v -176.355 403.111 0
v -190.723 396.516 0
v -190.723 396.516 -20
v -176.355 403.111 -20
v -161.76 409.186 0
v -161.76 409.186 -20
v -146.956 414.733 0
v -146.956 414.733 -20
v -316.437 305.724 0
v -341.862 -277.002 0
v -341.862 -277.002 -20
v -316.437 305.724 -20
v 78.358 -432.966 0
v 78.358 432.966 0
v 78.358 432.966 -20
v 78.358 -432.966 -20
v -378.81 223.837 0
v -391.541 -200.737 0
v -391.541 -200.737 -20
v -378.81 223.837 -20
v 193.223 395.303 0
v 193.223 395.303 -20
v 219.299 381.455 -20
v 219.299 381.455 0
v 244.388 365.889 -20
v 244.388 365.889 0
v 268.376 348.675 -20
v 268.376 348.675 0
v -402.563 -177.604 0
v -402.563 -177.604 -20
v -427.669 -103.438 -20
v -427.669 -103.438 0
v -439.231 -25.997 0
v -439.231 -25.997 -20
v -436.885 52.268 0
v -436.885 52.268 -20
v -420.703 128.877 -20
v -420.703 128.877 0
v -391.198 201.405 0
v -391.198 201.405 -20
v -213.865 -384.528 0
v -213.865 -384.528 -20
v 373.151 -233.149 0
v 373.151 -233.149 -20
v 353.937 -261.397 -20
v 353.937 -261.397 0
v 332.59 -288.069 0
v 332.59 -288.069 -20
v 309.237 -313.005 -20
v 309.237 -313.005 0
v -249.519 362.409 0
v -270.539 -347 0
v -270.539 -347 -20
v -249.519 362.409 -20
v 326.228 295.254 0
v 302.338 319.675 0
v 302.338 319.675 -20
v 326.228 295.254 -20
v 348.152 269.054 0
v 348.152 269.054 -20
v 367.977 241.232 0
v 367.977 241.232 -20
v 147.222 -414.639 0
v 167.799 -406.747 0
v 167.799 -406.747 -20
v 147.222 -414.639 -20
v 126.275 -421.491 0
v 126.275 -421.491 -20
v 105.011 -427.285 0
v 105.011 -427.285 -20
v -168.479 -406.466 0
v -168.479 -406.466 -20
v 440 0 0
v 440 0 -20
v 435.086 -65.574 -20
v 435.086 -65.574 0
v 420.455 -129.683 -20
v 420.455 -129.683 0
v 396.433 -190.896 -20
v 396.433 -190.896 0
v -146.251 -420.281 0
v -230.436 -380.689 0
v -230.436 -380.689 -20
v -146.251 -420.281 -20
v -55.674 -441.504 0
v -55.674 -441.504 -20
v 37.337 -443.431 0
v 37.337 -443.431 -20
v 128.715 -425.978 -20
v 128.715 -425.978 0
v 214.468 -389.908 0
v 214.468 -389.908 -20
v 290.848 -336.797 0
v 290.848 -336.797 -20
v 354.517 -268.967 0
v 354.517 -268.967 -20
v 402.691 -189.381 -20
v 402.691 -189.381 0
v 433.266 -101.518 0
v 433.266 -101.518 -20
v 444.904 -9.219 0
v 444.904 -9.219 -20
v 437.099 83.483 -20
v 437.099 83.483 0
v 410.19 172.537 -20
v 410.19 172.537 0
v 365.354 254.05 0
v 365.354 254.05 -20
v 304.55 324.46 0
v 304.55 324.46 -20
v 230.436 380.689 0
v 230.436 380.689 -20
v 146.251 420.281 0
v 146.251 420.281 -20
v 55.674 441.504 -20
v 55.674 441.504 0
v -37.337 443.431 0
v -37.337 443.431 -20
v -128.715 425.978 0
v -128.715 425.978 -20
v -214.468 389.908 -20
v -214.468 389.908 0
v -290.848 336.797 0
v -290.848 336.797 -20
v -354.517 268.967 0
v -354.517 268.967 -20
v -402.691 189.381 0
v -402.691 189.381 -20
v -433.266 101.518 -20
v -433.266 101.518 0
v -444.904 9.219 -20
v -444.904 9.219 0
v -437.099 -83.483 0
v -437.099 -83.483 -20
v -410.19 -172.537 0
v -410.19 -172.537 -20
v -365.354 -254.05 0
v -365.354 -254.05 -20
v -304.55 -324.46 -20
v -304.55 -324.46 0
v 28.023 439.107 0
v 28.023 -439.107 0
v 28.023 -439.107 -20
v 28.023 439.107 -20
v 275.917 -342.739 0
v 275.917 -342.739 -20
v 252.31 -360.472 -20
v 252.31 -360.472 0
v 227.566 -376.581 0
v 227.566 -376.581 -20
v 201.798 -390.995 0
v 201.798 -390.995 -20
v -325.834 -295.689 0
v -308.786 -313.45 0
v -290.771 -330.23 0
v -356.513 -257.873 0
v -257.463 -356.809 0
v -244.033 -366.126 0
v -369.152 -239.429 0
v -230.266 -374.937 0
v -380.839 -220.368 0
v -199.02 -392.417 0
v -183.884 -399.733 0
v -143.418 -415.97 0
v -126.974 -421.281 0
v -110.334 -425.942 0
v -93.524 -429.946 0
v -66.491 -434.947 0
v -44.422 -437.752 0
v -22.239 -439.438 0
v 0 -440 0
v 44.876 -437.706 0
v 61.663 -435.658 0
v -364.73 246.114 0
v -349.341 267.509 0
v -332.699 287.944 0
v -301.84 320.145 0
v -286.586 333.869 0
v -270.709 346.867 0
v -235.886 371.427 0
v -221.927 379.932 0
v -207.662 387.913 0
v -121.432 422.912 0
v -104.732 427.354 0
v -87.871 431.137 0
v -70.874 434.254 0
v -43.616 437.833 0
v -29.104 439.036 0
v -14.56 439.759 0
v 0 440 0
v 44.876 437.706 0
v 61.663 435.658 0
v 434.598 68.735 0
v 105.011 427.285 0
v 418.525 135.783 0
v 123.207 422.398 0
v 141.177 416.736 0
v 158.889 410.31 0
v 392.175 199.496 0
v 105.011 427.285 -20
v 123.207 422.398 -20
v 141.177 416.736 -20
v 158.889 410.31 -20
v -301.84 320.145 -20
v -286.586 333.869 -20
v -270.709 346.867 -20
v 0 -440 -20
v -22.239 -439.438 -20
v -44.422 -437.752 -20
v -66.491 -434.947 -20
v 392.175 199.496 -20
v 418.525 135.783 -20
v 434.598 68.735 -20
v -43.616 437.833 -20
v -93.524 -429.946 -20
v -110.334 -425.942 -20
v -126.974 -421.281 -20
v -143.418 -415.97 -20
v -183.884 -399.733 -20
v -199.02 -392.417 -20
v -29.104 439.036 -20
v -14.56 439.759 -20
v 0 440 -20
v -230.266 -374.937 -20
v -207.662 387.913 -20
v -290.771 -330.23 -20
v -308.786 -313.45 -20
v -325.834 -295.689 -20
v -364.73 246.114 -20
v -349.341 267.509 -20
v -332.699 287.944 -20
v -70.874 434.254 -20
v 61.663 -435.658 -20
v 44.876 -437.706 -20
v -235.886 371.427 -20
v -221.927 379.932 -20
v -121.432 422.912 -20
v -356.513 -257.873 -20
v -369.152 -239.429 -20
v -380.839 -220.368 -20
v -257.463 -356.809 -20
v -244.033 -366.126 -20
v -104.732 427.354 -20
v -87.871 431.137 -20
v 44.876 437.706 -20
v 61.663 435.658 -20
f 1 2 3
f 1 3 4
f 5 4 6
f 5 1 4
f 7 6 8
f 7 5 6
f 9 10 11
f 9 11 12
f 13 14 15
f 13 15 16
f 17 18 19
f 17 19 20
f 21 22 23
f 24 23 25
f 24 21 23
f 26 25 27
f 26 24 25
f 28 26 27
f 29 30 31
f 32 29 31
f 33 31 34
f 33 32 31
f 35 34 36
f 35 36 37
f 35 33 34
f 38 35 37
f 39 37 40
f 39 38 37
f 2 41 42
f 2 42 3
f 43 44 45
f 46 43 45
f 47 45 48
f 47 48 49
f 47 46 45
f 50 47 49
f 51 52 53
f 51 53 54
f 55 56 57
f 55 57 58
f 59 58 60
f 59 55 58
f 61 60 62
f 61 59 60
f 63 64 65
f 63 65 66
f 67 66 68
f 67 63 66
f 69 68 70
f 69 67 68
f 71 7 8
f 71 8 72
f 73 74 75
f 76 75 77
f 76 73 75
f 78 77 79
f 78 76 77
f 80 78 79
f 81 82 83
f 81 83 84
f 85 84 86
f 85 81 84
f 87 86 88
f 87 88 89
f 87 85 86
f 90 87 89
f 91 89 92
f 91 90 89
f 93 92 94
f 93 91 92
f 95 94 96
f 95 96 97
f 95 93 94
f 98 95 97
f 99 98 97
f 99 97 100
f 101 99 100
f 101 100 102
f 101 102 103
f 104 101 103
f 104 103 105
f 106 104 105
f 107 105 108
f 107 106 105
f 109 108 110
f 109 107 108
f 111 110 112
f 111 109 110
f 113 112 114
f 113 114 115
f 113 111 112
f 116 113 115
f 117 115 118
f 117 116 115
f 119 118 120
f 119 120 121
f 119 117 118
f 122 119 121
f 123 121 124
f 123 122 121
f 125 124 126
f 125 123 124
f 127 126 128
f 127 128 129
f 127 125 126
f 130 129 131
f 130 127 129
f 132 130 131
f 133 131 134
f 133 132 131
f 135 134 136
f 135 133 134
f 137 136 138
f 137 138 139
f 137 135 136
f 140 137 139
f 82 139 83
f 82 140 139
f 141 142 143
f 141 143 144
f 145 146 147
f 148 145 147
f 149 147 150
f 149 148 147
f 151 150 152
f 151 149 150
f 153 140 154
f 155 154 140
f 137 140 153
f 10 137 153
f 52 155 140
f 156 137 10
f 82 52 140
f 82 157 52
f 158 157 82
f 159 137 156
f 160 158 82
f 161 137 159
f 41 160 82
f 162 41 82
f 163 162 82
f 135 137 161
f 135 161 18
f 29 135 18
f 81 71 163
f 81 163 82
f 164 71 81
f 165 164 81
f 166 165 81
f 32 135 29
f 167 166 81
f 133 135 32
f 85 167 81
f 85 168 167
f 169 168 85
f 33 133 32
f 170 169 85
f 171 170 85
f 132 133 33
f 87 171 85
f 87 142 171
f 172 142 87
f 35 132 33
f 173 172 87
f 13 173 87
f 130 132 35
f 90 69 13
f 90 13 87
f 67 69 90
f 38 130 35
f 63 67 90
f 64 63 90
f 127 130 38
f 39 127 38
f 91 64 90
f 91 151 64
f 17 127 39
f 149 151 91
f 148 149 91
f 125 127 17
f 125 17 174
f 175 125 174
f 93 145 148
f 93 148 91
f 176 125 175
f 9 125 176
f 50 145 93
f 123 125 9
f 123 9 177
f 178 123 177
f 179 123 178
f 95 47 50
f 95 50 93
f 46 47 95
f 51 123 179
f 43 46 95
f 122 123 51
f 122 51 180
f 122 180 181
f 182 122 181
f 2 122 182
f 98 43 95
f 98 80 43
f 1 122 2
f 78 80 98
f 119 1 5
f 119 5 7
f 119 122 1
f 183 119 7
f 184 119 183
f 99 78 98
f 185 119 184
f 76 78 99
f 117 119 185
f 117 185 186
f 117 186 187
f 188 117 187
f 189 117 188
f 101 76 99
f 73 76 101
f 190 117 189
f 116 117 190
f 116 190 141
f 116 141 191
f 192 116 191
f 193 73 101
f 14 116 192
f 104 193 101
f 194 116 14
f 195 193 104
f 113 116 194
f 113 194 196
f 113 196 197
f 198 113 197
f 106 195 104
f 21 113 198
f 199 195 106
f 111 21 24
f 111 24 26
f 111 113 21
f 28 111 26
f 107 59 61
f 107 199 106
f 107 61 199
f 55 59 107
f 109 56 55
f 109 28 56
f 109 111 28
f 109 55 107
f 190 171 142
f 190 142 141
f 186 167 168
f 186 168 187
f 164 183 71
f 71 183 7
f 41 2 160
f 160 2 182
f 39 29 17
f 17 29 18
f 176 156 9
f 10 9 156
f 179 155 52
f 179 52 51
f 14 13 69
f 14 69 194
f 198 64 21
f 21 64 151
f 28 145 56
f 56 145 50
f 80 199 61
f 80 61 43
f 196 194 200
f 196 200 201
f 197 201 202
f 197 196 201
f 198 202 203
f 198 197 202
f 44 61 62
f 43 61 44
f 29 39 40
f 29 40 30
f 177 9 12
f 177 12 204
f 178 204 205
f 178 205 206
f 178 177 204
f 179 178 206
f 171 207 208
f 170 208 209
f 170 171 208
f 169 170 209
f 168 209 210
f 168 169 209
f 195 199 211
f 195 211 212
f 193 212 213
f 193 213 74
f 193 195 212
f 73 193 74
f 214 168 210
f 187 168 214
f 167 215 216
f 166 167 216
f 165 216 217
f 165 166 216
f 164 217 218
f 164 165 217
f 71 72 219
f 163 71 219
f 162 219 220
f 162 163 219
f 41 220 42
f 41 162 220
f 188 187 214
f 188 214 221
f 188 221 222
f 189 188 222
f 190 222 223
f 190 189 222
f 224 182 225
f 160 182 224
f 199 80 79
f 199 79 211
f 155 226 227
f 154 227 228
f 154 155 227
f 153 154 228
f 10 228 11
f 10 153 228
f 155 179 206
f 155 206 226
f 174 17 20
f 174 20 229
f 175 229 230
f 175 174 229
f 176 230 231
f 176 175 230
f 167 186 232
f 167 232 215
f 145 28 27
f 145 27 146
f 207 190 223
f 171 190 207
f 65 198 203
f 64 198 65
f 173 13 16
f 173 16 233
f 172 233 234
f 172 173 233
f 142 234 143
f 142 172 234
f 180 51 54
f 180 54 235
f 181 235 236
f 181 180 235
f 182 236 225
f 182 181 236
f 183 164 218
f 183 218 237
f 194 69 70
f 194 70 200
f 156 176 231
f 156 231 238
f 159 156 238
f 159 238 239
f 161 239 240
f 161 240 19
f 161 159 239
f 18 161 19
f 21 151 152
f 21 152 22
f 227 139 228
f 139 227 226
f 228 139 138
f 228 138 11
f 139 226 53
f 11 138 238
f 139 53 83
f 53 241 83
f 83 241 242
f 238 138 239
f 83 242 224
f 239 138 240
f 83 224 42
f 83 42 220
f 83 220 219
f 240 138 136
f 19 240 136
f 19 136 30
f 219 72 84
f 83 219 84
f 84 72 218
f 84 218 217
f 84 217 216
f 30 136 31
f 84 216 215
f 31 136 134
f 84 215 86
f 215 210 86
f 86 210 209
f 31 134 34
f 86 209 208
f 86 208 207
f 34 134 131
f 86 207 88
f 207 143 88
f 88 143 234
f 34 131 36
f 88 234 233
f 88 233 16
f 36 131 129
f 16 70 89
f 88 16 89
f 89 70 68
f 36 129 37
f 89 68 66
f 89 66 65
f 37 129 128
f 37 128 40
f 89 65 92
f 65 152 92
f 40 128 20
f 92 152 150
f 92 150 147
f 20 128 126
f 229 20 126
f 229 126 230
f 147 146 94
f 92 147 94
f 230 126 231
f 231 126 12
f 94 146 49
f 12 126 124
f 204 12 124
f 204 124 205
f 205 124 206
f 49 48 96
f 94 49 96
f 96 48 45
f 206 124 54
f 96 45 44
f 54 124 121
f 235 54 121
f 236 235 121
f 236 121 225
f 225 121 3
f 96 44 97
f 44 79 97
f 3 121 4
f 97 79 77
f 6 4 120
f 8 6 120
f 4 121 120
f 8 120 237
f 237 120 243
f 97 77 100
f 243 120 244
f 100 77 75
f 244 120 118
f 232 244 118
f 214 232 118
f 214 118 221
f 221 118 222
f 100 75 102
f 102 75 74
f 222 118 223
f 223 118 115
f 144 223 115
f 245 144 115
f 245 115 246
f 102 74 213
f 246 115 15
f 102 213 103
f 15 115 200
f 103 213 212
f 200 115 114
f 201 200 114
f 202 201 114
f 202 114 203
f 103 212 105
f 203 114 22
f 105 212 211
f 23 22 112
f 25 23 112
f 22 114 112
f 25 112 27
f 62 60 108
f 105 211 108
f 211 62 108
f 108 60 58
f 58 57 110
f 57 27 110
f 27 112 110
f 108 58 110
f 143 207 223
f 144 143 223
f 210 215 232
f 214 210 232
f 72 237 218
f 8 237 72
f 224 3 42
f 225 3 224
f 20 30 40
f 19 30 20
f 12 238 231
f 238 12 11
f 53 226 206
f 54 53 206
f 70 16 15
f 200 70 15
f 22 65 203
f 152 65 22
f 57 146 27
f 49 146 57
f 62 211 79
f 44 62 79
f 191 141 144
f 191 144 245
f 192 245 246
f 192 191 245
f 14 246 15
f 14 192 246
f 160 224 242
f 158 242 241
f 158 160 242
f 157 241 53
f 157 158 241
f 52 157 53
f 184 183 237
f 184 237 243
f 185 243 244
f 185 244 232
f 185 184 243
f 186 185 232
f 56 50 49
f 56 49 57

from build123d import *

# Parameters (mm, degrees)
F1_DEPTH = 20


with BuildPart() as f1:
    # F0 (on Top) → F1 (new body)
    with BuildSketch(Plane.XY):
        with BuildLine():
            Line((-270.5386970375, -346.9997311313), (-270.7217620056, -353.178039488))
            ThreePointArc((-270.7217620056, -353.178039488), (-250.9562000988, -367.4860346081), (-230.4360952891, -380.6891198707))
            Line((-230.4360952891, -380.6891198707), (-230.265657339, -374.9369641023))
            ThreePointArc((-230.2656573389, -374.9369641023), (-250.7914922543, -361.5295664436), (-270.5386970375, -346.9997311313))
        make_face()
        with BuildLine():
            ThreePointArc((-402.562994487, -177.6035908131), (-397.2206510106, -189.250507029), (-391.5414264828, -200.7369207392))
            Line((-391.5414264828, -200.7369207392), (-378.8101580312, 223.8366908537))
            ThreePointArc((-378.8101580312, 223.8366908537), (-385.1674232463, 212.7112034422), (-391.1980296982, 201.4053166136))
            Line((-391.1980296982, 201.4053166136), (-402.562994487, -177.6035908131))
        make_face()
        with BuildLine():
            ThreePointArc((-356.5130720875, -257.8728939433), (-349.3185745571, -267.5379103406), (-341.8621362052, -277.0023101514))
            Line((-341.8621362052, -277.0023101514), (-316.4372711676, 305.7244730407))
            ThreePointArc((-316.4372711676, 305.7244730407), (-324.6896849683, 296.9454638064), (-332.6986262228, 287.9437863707))
            Line((-332.6986262228, 287.9437863707), (-356.5130720875, -257.8728939433))
        make_face()
        with BuildLine():
            ThreePointArc((-290.771309932, -330.2302913429), (-280.7802245685, -338.7660925938), (-270.5386970375, -346.9997311313))
            Line((-270.5386970375, -346.9997311313), (-249.5187169425, 362.4091746843))
            ThreePointArc((-249.5187169425, 362.4091746843), (-260.22977901, 354.7963671127), (-270.708728898, 346.8670986105))
            Line((-270.708728898, 346.8670986105), (-290.771309932, -330.2302913429))
        make_face()
        with BuildLine():
            Line((-207.6622074156, 387.912886627), (-230.265657339, -374.9369641023))
            ThreePointArc((-230.2656573389, -374.9369641023), (-222.1173118779, -379.8208785258), (-213.8654246951, -384.5277364768))
            Line((-213.8654246951, -384.5277364768), (-190.7228909108, 396.5157990328))
            ThreePointArc((-190.7228909108, 396.5157990328), (-199.2389875692, 392.3057810336), (-207.6622074156, 387.912886627))
        make_face()
        with BuildLine():
            Line((-70.8738586956, 434.2544140865), (-70.7405367429, 439.341298379))
            ThreePointArc((-70.7405367429, 439.341298379), (-431.4752027521, 108.8767624889), (-270.7217620056, -353.178039488))
            Line((-270.7217620056, -353.178039488), (-270.5386970375, -346.9997311313))
            ThreePointArc((-270.5386970375, -346.9997311313), (-280.7802245685, -338.7660925938), (-290.771309932, -330.2302913429))
            ThreePointArc((-290.771309932, -330.2302913429), (-317.4343613856, -304.6890648049), (-341.8621362052, -277.0023101514))
            ThreePointArc((-341.8621362052, -277.0023101514), (-349.3185745571, -267.5379103406), (-356.5130720875, -257.8728939433))
            ThreePointArc((-356.5130720875, -257.8728939433), (-375.1166659405, -229.9727960731), (-391.5414264828, -200.7369207392))
            ThreePointArc((-391.5414264828, -200.7369207392), (-397.2206510106, -189.250507029), (-402.562994487, -177.6035908131))
            ThreePointArc((-402.562994487, -177.6035908131), (-439.8023179294, 13.187916588), (-391.1980296982, 201.4053166136))
            ThreePointArc((-391.1980296982, 201.4053166136), (-385.1674232463, 212.7112034422), (-378.8101580312, 223.8366908537))
            ThreePointArc((-378.8101580312, 223.8366908537), (-357.1954891114, 256.9268038926), (-332.6986262228, 287.9437863707))
            ThreePointArc((-332.6986262228, 287.9437863707), (-324.6896849683, 296.9454638064), (-316.4372711676, 305.7244730407))
            ThreePointArc((-316.4372711676, 305.7244730407), (-294.2928562808, 327.0958800445), (-270.708728898, 346.8670986105))
            ThreePointArc((-270.708728898, 346.8670986105), (-260.22977901, 354.7963671127), (-249.5187169425, 362.4091746843))
            ThreePointArc((-249.5187169425, 362.4091746843), (-228.9458652825, 375.7443156856), (-207.6622074156, 387.912886627))
            ThreePointArc((-207.6622074156, 387.912886627), (-199.2389875692, 392.3057810336), (-190.7228909108, 396.5157990328))
            ThreePointArc((-190.7228909108, 396.5157990328), (-169.0852127848, 406.2144640673), (-146.9564772982, 414.7334008494))
            ThreePointArc((-146.9564772982, 414.7334008494), (-134.2564645291, 419.0169468317), (-121.4318768159, 422.9116920741))
            ThreePointArc((-121.4318768159, 422.9116920741), (-96.3199787859, 429.3279185968), (-70.8738586956, 434.2544140865))
        make_face()
        with BuildLine():
            Line((-143.4181009985, -415.9702493039), (-121.4318768159, 422.9116920741))
            ThreePointArc((-121.4318768159, 422.9116920741), (-134.2564645291, 419.0169468317), (-146.9564772982, 414.7334008494))
            Line((-146.9564772982, 414.7334008494), (-168.4792645982, -406.4661577554))
            ThreePointArc((-168.4792645982, -406.4661577554), (-156.0210678261, -411.4090742733), (-143.4181009985, -415.9702493039))
        make_face()
        with BuildLine():
            ThreePointArc((-43.616286433, 437.8328671511), (-57.2730273731, 436.2565762662), (-70.8738586956, 434.2544140865))
            Line((-70.8738586956, 434.2544140865), (-93.5236465706, -429.9457262634))
            ThreePointArc((-93.5236465706, -429.9457262634), (-80.0463646466, -432.6575776603), (-66.4909418972, -434.9470710852))
            Line((-66.4909418972, -434.9470710852), (-43.616286433, 437.8328671511))
        make_face()
        with BuildLine():
            Line((0, 440), (0, -440))
            ThreePointArc((0, -440), (14.0186355194, -439.7766226827), (28.0230371971, -439.1067175372))
            Line((28.0230371971, -439.1067175372), (28.0230371971, 439.1067175372))
            ThreePointArc((28.0230371971, 439.1067175372), (14.0186355194, 439.7766226827), (0, 440))
        make_face()
        with BuildLine():
            Line((78.35839003, 432.9664683459), (78.35839003, -432.9664683459))
            ThreePointArc((78.35839003, -432.9664683459), (91.7286409393, -430.3322628289), (105.0109050122, -427.2852792088))
            Line((105.0109050122, -427.2852792088), (105.0109050122, 427.2852792088))
            ThreePointArc((105.0109050122, 427.2852792088), (91.7286409393, 430.3322628289), (78.35839003, 432.9664683459))
        make_face()
        with BuildLine():
            Line((158.8886932936, 410.3101060704), (167.7992454591, -406.7473579796))
            ThreePointArc((167.7992454591, -406.7473579796), (184.9665523772, -399.233483693), (201.798344937, -390.9954321737))
            Line((201.798344937, -390.9954321737), (193.2232359584, 395.3034038378))
            ThreePointArc((193.2232359584, 395.3034038378), (176.2157852134, 403.1724160228), (158.8886932936, 410.3101060704))
        make_face()
        with BuildLine():
            Line((268.376457209, 348.6747441613), (275.9167800325, -342.7388663348))
            ThreePointArc((275.9167800325, -342.7388663348), (292.9545944223, -328.2949978402), (309.2374568684, -313.0051042228))
            Line((309.2374568684, -313.0051042228), (302.3376646701, 319.6747355075))
            ThreePointArc((302.3376646701, 319.6747355075), (285.7252217666, 334.6058840583), (268.376457209, 348.6747441613))
        make_face()
        with BuildLine():
            Line((367.9772639554, 241.2317002633), (373.1507016006, -233.1492095096))
            ThreePointArc((373.1507016006, -233.1492095096), (385.3711791661, -212.3418335329), (396.4325833067, -190.8958011398))
            Line((396.4325833067, -190.8958011398), (392.175101476, 199.4960896417))
            ThreePointArc((392.175101476, 199.4960896417), (380.6486174495, 220.6957861714), (367.9772639554, 241.2317002633))
        make_face()
        with BuildLine():
            ThreePointArc((0, -445), (314.662517628, -314.662517628), (445, 0))
            ThreePointArc((445, 0), (288.570148447, 338.7510434306), (-70.7405367429, 439.341298379))
            Line((-70.7405367429, 439.341298379), (-70.8738586956, 434.2544140865))
            ThreePointArc((-70.8738586956, 434.2544140865), (-57.2730273731, 436.2565762662), (-43.616286433, 437.8328671511))
            ThreePointArc((-43.616286433, 437.8328671511), (-21.835045838, 439.4578828207), (0, 440))
            ThreePointArc((0, 440), (14.0186355194, 439.7766226827), (28.0230371971, 439.1067175372))
            ThreePointArc((28.0230371971, 439.1067175372), (53.2792424848, 436.7623178804), (78.35839003, 432.9664683459))
            ThreePointArc((78.35839003, 432.9664683459), (91.7286409393, 430.3322628289), (105.0109050122, 427.2852792088))
            ThreePointArc((105.0109050122, 427.2852792088), (132.2224966571, 419.663211847), (158.8886932936, 410.3101060704))
            ThreePointArc((158.8886932936, 410.3101060704), (176.2157852134, 403.1724160228), (193.2232359584, 395.3034038378))
            ThreePointArc((193.2232359584, 395.3034038378), (231.9744105691, 373.8821643795), (268.376457209, 348.6747441613))
            ThreePointArc((268.376457209, 348.6747441613), (285.7252217666, 334.6058840583), (302.3376646701, 319.6747355075))
            ThreePointArc((302.3376646701, 319.6747355075), (337.4445929766, 282.3670424658), (367.9772639554, 241.2317002633))
            ThreePointArc((367.9772639554, 241.2317002633), (380.6486174495, 220.6957861714), (392.175101476, 199.4960896417))
            ThreePointArc((392.175101476, 199.4960896417), (427.8767606738, 102.5742544467), (440, 0))
            ThreePointArc((440, 0), (428.969892099, -97.9021535643), (396.4325833067, -190.8958011398))
            ThreePointArc((396.4325833067, -190.8958011398), (385.3711791661, -212.3418335329), (373.1507016006, -233.1492095096))
            ThreePointArc((373.1507016006, -233.1492095096), (343.5224020131, -274.9406468952), (309.2374568684, -313.0051042228))
            ThreePointArc((309.2374568684, -313.0051042228), (292.9545944223, -328.2949978402), (275.9167800325, -342.7388663348))
            ThreePointArc((275.9167800325, -342.7388663348), (240.0731330091, -368.7341736362), (201.798344937, -390.9954321737))
            ThreePointArc((201.798344937, -390.9954321737), (184.9665523772, -399.233483693), (167.7992454591, -406.7473579796))
            ThreePointArc((167.7992454591, -406.7473579796), (136.7910673332, -418.1963700199), (105.0109050122, -427.2852792088))
            ThreePointArc((105.0109050122, -427.2852792088), (91.7286409393, -430.3322628289), (78.35839003, -432.9664683459))
            ThreePointArc((78.35839003, -432.9664683459), (53.2792424848, -436.7623178804), (28.0230371971, -439.1067175372))
            ThreePointArc((28.0230371971, -439.1067175372), (14.0186355194, -439.7766226827), (0, -440))
            Line((0, -440), (0, -445))
        make_face()
        with BuildLine():
            ThreePointArc((-230.4360952891, -380.6891198707), (-119.6209464466, -428.6208454698), (0, -445))
            Line((0, -445), (0, -440))
            ThreePointArc((0, -440), (-33.3413311259, -438.7349491877), (-66.4909418972, -434.9470710852))
            ThreePointArc((-66.4909418972, -434.9470710852), (-80.0463646466, -432.6575776603), (-93.5236465706, -429.9457262634))
            ThreePointArc((-93.5236465706, -429.9457262634), (-118.6767728932, -423.693077092), (-143.4181009985, -415.9702493039))
            ThreePointArc((-143.4181009985, -415.9702493039), (-156.0210678261, -411.4090742733), (-168.4792645982, -406.4661577554))
            ThreePointArc((-168.4792645982, -406.4661577554), (-191.4867852876, -396.1474612568), (-213.8654246951, -384.5277364768))
            ThreePointArc((-213.8654246951, -384.5277364768), (-222.1173118779, -379.8208785258), (-230.2656573389, -374.9369641023))
            Line((-230.265657339, -374.9369641023), (-230.4360952891, -380.6891198707))
        make_face()
    extrude(amount=-F1_DEPTH)


solid = f1.part
